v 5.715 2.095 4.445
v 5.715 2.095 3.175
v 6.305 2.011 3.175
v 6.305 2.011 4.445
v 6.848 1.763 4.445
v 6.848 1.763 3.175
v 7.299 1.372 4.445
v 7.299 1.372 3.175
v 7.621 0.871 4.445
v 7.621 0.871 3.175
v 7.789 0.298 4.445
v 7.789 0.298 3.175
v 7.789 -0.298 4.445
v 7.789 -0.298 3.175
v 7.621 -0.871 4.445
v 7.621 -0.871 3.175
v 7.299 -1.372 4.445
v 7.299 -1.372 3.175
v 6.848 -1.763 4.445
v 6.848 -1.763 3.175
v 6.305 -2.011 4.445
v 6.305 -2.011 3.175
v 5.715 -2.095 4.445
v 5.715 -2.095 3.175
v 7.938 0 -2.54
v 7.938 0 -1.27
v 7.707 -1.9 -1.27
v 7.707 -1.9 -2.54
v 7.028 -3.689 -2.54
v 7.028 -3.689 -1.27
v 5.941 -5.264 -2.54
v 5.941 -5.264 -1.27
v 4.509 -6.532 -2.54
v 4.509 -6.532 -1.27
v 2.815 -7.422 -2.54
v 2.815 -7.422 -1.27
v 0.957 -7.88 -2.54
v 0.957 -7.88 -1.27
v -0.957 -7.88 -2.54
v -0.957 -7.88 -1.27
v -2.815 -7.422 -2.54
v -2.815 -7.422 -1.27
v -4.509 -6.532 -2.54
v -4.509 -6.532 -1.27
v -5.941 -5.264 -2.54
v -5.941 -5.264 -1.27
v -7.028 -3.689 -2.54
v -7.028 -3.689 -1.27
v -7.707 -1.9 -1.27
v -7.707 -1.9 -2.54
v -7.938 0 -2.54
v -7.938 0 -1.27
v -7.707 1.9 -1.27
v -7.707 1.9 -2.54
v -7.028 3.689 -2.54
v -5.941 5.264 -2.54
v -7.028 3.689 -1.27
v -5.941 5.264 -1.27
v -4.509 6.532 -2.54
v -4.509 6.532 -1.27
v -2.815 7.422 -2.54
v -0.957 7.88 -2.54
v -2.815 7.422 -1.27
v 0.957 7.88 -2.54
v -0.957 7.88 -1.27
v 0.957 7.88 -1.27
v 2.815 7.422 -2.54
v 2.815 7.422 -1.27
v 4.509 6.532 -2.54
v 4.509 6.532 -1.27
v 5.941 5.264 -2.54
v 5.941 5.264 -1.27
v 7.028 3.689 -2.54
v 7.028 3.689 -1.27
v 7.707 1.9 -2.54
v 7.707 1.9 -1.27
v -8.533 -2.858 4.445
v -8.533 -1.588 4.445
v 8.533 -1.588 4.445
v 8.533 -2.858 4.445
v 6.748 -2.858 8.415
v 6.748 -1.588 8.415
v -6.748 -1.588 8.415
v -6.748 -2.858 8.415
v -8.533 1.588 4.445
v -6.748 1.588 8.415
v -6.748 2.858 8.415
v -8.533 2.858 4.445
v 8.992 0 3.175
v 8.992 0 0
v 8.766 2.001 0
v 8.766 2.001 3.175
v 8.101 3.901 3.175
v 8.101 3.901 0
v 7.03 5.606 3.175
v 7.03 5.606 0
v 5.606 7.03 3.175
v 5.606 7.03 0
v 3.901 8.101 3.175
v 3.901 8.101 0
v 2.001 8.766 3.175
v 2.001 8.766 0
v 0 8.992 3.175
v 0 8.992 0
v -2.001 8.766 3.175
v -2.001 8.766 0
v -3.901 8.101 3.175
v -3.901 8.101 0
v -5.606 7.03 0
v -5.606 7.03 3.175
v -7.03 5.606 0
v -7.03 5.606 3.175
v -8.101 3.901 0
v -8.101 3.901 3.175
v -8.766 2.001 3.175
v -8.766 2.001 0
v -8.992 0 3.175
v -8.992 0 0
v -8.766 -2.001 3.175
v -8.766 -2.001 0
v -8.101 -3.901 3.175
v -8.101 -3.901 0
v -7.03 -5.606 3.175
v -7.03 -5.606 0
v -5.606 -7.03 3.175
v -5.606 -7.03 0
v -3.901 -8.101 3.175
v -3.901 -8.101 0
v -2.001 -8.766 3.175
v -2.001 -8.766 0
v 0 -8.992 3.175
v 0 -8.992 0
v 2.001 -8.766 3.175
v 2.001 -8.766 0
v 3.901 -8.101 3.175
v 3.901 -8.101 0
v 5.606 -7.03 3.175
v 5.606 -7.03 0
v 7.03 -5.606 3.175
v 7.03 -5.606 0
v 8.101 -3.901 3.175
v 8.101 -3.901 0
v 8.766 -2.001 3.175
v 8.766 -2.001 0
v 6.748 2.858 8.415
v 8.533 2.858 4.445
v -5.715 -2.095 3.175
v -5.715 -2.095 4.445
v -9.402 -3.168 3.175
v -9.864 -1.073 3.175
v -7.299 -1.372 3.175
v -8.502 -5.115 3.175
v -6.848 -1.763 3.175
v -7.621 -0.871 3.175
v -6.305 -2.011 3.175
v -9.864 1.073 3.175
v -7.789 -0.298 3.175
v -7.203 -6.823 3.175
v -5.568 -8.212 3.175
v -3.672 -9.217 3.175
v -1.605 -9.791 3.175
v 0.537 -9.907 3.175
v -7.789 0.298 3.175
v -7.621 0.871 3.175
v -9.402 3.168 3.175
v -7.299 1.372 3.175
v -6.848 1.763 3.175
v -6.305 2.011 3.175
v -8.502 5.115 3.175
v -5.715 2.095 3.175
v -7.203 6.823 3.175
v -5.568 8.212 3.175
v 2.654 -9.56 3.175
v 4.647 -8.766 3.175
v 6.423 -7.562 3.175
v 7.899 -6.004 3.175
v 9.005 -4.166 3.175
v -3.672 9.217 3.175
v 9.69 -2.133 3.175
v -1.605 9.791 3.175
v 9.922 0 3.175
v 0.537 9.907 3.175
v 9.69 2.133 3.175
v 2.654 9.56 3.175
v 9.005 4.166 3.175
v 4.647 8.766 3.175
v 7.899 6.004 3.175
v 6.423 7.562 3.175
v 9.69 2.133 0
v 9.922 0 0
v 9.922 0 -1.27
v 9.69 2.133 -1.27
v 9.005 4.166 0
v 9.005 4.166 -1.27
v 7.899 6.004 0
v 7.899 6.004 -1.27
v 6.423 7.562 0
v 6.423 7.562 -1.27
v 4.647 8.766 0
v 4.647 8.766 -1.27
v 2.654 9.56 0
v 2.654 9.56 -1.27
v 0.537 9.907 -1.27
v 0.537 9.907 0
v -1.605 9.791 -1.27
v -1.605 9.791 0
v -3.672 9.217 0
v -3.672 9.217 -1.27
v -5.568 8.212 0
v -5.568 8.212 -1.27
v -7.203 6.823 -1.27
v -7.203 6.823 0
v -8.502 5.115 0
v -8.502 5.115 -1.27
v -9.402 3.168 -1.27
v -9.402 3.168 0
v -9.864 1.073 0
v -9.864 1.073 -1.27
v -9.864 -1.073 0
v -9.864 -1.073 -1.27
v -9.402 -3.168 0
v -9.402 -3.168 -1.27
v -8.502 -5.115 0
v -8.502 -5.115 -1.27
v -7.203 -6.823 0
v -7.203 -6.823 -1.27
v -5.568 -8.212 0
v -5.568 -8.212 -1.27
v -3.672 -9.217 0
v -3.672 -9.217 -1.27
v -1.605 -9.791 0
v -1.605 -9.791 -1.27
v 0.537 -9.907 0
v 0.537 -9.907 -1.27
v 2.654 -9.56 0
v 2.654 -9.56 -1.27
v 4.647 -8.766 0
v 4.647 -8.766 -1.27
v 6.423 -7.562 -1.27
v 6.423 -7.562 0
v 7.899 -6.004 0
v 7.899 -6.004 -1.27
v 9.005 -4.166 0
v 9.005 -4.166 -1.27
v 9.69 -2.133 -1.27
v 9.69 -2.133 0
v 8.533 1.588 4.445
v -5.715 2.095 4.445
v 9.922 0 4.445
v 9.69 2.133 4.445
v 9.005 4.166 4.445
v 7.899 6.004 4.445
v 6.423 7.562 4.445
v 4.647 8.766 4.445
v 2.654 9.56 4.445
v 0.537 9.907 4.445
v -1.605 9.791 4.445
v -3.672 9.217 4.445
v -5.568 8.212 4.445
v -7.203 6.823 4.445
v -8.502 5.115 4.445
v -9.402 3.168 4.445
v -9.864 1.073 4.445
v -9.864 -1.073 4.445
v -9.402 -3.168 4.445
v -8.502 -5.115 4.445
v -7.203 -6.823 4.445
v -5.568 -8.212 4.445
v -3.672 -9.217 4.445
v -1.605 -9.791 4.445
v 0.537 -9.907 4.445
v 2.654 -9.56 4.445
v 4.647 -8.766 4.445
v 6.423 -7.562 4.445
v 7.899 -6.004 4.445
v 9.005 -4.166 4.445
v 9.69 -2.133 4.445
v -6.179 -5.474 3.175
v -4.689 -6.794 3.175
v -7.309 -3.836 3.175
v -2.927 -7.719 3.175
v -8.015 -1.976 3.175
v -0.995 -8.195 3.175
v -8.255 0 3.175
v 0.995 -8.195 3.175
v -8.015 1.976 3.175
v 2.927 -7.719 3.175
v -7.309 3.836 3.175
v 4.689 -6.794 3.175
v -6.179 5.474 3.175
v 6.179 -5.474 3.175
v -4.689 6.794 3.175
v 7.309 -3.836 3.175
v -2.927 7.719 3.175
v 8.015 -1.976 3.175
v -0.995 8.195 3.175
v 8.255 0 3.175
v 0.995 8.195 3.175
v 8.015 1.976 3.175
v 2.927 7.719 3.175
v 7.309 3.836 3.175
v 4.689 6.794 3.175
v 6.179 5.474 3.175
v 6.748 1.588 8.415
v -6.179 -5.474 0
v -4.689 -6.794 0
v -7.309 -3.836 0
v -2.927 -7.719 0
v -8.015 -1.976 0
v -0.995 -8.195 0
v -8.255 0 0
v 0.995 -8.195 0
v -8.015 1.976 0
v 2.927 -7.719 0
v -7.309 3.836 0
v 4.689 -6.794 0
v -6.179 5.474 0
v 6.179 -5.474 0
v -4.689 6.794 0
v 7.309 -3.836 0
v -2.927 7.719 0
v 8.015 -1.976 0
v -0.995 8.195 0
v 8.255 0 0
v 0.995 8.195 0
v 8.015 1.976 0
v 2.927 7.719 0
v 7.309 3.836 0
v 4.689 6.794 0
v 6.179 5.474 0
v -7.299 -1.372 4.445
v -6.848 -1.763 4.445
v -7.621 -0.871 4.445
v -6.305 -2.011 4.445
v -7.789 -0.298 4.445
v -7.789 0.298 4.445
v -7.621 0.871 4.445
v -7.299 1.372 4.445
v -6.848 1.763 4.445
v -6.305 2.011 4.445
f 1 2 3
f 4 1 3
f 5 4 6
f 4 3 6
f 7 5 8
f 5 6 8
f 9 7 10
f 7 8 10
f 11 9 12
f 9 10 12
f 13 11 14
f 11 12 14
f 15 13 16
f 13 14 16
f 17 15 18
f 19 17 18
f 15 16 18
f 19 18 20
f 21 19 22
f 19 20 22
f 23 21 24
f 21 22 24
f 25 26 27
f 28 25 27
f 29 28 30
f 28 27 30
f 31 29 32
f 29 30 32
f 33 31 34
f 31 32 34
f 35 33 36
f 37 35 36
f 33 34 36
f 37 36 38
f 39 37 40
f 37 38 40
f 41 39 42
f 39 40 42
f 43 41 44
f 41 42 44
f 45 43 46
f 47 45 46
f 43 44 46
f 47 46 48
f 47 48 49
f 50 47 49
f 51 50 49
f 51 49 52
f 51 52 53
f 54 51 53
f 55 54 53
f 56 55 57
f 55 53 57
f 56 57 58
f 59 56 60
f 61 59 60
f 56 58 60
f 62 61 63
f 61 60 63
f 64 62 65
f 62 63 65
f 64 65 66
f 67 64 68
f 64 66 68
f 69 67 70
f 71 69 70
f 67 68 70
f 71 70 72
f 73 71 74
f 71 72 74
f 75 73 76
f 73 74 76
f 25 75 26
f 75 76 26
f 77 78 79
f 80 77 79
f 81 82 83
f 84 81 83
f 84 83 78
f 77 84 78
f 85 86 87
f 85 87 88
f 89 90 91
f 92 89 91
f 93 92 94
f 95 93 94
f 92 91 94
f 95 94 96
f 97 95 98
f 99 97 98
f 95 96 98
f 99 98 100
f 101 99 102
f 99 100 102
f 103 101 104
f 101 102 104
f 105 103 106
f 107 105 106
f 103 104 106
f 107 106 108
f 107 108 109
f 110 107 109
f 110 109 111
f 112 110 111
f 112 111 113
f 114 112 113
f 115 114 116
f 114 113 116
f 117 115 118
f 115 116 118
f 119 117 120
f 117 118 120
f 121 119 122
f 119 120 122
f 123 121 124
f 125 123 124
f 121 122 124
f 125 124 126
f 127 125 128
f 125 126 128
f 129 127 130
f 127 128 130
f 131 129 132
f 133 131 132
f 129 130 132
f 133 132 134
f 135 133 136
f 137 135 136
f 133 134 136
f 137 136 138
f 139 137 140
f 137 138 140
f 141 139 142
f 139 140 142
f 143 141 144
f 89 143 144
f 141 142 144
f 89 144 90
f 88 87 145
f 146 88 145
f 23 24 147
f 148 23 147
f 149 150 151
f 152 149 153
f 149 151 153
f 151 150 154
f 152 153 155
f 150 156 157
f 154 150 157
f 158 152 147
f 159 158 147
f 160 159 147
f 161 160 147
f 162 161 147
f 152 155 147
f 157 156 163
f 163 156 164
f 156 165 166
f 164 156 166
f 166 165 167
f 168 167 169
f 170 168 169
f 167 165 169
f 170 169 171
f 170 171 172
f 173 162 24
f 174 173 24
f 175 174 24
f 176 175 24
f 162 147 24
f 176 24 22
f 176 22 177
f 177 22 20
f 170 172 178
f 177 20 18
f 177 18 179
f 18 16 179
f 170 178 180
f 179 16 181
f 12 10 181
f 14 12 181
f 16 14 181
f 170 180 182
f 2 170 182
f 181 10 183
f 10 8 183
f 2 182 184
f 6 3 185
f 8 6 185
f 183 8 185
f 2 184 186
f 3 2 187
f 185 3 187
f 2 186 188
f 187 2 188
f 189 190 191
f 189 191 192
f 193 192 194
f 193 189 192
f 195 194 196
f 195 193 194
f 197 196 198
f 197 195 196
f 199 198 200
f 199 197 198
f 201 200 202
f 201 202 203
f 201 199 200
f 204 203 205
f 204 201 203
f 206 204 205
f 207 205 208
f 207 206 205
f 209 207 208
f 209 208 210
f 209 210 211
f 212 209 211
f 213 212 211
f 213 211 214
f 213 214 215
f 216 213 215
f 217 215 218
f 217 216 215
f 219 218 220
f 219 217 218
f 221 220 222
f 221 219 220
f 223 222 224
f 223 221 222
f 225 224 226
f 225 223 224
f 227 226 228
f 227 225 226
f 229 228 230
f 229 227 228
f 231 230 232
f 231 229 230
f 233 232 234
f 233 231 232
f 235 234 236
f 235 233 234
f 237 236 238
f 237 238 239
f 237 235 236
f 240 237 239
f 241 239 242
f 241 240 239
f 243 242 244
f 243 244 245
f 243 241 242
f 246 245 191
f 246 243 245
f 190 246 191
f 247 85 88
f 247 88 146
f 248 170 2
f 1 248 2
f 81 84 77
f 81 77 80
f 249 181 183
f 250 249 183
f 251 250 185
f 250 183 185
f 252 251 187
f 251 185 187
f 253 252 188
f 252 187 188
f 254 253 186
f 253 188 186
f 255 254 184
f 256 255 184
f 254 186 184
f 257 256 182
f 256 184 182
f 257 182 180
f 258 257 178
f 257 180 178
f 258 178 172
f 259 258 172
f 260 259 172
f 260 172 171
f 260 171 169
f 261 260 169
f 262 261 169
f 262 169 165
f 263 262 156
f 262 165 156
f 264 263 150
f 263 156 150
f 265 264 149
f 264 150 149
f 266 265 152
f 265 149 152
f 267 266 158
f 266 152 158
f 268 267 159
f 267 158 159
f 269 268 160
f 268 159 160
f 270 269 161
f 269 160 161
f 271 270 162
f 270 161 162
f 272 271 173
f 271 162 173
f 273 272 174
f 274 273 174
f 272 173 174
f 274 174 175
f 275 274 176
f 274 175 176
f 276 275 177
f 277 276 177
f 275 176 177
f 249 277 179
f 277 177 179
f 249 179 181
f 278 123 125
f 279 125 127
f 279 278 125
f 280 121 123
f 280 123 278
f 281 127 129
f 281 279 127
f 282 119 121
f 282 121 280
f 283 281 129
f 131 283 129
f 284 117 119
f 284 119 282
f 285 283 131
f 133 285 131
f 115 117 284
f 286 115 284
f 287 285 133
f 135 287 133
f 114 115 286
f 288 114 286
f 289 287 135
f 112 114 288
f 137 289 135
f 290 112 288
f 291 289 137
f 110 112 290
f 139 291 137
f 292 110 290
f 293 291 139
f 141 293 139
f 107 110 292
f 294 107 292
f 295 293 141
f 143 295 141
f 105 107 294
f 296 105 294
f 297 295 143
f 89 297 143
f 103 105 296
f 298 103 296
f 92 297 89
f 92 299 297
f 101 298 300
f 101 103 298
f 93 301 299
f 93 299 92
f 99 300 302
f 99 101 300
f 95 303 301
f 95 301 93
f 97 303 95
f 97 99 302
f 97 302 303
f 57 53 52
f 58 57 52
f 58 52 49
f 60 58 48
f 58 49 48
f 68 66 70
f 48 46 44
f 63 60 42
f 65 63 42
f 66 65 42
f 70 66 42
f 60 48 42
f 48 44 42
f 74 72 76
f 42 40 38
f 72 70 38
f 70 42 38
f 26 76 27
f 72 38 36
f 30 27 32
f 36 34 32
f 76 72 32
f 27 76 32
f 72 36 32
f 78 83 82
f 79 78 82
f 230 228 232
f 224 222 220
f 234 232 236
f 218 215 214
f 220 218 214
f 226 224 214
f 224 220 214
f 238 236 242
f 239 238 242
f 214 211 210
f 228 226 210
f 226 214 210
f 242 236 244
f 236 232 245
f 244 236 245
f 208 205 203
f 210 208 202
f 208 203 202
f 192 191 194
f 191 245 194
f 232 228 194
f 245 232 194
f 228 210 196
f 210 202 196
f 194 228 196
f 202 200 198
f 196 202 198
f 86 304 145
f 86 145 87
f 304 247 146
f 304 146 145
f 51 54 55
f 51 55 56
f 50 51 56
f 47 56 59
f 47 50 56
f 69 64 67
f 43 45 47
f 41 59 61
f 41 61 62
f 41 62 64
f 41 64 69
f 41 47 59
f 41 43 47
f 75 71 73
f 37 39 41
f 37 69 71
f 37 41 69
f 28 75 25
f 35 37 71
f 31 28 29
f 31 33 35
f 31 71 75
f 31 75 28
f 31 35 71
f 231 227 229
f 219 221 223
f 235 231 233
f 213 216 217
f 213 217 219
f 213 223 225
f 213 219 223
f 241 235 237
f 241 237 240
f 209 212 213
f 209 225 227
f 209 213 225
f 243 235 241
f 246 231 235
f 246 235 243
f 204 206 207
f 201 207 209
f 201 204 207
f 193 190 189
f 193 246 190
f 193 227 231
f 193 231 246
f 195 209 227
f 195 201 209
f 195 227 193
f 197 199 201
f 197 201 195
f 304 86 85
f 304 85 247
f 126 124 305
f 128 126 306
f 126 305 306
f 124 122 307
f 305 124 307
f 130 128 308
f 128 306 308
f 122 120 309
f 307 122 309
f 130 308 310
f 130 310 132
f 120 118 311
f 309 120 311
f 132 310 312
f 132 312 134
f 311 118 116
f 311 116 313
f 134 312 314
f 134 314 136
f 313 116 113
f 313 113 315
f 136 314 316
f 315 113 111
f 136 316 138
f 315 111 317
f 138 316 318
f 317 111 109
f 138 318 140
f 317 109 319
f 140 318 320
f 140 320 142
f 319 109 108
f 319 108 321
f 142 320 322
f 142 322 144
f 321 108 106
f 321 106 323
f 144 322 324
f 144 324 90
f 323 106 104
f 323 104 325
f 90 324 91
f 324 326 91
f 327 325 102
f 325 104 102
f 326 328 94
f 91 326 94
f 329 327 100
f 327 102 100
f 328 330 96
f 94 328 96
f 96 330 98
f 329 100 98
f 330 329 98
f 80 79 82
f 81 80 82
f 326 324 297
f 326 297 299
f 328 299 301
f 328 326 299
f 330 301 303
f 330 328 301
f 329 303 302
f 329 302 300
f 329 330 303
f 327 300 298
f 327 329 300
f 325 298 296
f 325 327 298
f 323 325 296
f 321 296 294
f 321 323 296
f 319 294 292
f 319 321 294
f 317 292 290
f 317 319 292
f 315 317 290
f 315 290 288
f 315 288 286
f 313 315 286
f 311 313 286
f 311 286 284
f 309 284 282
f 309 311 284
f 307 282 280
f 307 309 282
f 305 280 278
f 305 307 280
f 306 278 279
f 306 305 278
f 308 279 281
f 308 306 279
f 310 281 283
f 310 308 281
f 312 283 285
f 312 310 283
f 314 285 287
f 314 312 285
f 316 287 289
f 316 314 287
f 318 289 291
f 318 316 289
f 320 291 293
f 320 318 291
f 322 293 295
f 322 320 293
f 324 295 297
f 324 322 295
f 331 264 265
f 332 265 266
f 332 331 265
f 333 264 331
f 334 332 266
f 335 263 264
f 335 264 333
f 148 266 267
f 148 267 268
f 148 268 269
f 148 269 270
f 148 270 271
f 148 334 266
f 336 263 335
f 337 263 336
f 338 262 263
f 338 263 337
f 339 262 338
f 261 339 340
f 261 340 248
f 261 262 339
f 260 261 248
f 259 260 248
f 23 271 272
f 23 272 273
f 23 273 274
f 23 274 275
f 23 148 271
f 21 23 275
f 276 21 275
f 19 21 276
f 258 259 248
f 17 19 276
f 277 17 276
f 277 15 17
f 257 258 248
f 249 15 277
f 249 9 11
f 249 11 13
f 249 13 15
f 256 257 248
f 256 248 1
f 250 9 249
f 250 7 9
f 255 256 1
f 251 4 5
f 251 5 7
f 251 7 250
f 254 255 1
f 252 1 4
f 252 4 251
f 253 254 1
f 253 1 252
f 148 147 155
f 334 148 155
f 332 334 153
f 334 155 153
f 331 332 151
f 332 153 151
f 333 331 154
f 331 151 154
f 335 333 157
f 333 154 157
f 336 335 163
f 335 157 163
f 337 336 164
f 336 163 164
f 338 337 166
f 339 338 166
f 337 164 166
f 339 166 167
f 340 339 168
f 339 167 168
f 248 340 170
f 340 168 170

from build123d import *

# Parameters (mm, degrees)
F0_R      = 9.921875
F0_R_2    = 8.9916
F0_R_3    = 8.255
F1_DEPTH  = 1.27
F3_R      = 7.9375
F4_DEPTH  = 1.27
F5_DEPTH  = 3.175
F7_R      = 9.921875
F8_DEPTH  = 1.27
F11_DEPTH = 1.27


with BuildPart() as f1:
    # F0 (on Top) → F1 (new body)
    with BuildSketch(Plane.XY):
        Circle(F0_R)
        Circle(F0_R_2, mode=Mode.SUBTRACT)
        Circle(F0_R_2)
        Circle(F0_R_3, mode=Mode.SUBTRACT)
        Circle(F0_R_3)
        with BuildLine():
            ThreePointArc((-5.715, -2.0955), (-7.8105, 0), (-5.715, 2.0955))
            Line((-5.715, 2.0955), (5.715, 2.0955))
            ThreePointArc((5.715, 2.0955), (7.8105, 0), (5.715, -2.0955))
            Line((5.715, -2.0955), (-5.715, -2.0955))
        make_face(mode=Mode.SUBTRACT)
        with BuildLine():
            Line((5.715, 2.0955), (-5.715, 2.0955))
            ThreePointArc((-5.715, 2.0955), (-7.8105, 0), (-5.715, -2.0955))
            Line((-5.715, -2.0955), (5.715, -2.0955))
            ThreePointArc((5.715, -2.0955), (7.8105, 0), (5.715, 2.0955))
        make_face()
    extrude(amount=-F1_DEPTH)


with BuildPart() as f4:
    # F3 (on offset) → F4 (new body)
    with BuildSketch(Plane(origin=(0, 0, -1.27), x_dir=(1, 0, 0), z_dir=(0, 0, -1))):
        Circle(F3_R)
    extrude(amount=F4_DEPTH)


with BuildPart() as f5:
    # F0 (on Top) → F5 (new body)
    with BuildSketch(Plane.XY):
        Circle(F0_R_2)
        Circle(F0_R_3, mode=Mode.SUBTRACT)
    extrude(amount=F5_DEPTH)


with BuildPart() as f8:
    # F7 (on offset) → F8 (new body)
    with BuildSketch(Plane.XY.offset(3.175)):
        Circle(F7_R)
        with BuildLine():
            ThreePointArc((-5.715, -2.0955), (-7.8105, 0), (-5.715, 2.0955))
            Line((-5.715, 2.0955), (5.715, 2.0955))
            ThreePointArc((5.715, 2.0955), (7.8105, 0), (5.715, -2.0955))
            Line((5.715, -2.0955), (-5.715, -2.0955))
        make_face(mode=Mode.SUBTRACT)
    extrude(amount=F8_DEPTH)


with BuildPart() as f11:
    # F10 (on offset) → F11 (new body)
    with BuildSketch(Plane.XZ.offset(1.5875)):
        Polygon((6.74751, 8.41502), (-6.74751, 8.41502), (-8.53313, 4.445), (8.53313, 4.445), align=None)
    extrude(amount=F11_DEPTH)


with BuildPart() as f12_1:
    # F12: instance of F11
    add(f11.part.mirror(Plane.XZ))


solid = Compound([f1.part, f4.part, f5.part, f8.part, f11.part, f12_1.part])
